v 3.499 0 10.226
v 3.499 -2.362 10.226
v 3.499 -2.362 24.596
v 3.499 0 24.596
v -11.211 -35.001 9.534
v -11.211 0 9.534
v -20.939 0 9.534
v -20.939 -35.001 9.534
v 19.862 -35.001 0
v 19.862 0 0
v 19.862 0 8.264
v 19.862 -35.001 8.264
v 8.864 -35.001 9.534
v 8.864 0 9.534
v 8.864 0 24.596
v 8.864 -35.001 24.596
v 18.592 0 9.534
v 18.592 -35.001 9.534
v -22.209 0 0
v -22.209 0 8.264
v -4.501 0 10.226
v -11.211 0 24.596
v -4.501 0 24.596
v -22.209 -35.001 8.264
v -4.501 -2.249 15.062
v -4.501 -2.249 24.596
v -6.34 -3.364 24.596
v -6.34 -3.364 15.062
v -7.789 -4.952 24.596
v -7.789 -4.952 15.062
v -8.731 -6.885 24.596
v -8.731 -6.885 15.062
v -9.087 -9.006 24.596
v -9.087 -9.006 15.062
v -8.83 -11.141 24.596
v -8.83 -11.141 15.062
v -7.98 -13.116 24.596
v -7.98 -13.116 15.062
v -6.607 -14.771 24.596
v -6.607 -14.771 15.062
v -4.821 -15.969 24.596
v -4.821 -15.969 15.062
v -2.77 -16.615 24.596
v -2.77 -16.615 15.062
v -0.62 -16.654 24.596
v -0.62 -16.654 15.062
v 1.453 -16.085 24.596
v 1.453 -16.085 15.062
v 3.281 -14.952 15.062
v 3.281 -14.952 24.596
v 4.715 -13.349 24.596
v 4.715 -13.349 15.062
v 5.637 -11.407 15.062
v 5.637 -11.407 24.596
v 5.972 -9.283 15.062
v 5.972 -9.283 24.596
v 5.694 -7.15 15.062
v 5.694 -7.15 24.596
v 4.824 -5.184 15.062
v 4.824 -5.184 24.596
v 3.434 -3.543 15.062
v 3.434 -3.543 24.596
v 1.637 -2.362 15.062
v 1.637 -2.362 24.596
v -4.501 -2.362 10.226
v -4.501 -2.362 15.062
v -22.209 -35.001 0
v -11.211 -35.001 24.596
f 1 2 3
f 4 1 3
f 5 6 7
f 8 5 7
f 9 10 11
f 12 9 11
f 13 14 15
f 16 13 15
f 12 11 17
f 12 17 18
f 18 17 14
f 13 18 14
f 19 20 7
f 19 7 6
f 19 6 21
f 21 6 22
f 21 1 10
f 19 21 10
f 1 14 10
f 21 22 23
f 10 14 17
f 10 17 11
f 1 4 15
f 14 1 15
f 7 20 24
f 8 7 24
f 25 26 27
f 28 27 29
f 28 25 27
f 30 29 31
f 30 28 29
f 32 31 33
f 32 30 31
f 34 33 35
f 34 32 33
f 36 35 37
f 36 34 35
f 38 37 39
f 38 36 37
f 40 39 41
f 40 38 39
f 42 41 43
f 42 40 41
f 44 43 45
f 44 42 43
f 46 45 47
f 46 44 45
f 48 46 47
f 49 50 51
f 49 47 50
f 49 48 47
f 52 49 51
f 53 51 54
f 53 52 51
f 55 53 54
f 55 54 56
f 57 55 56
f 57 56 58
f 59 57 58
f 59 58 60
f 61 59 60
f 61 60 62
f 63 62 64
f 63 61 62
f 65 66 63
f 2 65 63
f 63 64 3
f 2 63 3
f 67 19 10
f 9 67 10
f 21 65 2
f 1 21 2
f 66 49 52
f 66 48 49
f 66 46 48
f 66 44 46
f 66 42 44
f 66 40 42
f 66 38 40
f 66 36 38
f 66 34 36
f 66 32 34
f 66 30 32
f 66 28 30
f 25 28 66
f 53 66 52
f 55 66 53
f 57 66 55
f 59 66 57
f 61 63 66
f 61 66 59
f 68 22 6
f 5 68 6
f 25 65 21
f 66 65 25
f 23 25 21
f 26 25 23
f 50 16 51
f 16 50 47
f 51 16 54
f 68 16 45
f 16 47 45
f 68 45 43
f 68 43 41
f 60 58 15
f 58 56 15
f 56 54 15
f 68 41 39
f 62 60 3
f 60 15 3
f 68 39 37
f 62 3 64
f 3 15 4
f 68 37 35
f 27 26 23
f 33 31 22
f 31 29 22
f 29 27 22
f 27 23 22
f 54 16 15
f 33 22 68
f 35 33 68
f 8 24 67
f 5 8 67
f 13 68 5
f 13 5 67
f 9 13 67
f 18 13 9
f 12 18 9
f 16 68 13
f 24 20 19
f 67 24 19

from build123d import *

# Parameters (mm, degrees)
F1_DEPTH = 35.0012
F2_R     = 7.5311
F3_DEPTH = 24.638
F4_DEPTH = 15.0622
F5_W     = 7.9995468259
F5_H     = 14.370085096
F6_DEPTH = 2.3622
F7_SIZE  = 1.27


# Not quite as in the source:
# - a feature names something its author has since deleted; it is built from what else it names


with BuildPart() as f1:
    # F0 (on Front) → F1 (new body)
    with BuildSketch(Plane.XZ):
        Polygon((-22.2087535855, 0), (-22.0162163296, 0), (19.8619475364, 0), (19.8619475364, 9.5335517829), (8.8637475364, 9.5335517829), (8.8637475364, 24.5957517829), (-11.2105535855, 24.5957517829), (-11.2105535855, 9.5335517829), (-22.2087535855, 9.5335517829), align=None)
    extrude(amount=F1_DEPTH)

    # F2 (on Top) → F3 (cut)
    with BuildSketch(Plane.XY):
        with Locations((-1.5582955675, -9.1819977388)):
            Circle(F2_R)
    extrude(amount=F3_DEPTH, mode=Mode.SUBTRACT)

    # F2 (on Top) → F4 (join)
    with BuildSketch(Plane.XY):
        with Locations((-1.5582955675, -9.1819977388)):
            Circle(F2_R)
    extrude(amount=F4_DEPTH)

    # F5 (on face) → F6 (cut, symmetric)
    with BuildSketch(Plane.XZ):
        with Locations((-0.500776805, 17.4107092349)):
            Rectangle(F5_W, F5_H)
    extrude(amount=F6_DEPTH, both=True, mode=Mode.SUBTRACT)

    # F7
    f7_edges = [f1.edges().sort_by_distance(p)[0] for p in [
        (19.861948, -17.5006, 9.533552),
        (-22.208754, -17.5006, 9.533552),
    ]]
    chamfer(f7_edges, length=F7_SIZE)


solid = f1.part
